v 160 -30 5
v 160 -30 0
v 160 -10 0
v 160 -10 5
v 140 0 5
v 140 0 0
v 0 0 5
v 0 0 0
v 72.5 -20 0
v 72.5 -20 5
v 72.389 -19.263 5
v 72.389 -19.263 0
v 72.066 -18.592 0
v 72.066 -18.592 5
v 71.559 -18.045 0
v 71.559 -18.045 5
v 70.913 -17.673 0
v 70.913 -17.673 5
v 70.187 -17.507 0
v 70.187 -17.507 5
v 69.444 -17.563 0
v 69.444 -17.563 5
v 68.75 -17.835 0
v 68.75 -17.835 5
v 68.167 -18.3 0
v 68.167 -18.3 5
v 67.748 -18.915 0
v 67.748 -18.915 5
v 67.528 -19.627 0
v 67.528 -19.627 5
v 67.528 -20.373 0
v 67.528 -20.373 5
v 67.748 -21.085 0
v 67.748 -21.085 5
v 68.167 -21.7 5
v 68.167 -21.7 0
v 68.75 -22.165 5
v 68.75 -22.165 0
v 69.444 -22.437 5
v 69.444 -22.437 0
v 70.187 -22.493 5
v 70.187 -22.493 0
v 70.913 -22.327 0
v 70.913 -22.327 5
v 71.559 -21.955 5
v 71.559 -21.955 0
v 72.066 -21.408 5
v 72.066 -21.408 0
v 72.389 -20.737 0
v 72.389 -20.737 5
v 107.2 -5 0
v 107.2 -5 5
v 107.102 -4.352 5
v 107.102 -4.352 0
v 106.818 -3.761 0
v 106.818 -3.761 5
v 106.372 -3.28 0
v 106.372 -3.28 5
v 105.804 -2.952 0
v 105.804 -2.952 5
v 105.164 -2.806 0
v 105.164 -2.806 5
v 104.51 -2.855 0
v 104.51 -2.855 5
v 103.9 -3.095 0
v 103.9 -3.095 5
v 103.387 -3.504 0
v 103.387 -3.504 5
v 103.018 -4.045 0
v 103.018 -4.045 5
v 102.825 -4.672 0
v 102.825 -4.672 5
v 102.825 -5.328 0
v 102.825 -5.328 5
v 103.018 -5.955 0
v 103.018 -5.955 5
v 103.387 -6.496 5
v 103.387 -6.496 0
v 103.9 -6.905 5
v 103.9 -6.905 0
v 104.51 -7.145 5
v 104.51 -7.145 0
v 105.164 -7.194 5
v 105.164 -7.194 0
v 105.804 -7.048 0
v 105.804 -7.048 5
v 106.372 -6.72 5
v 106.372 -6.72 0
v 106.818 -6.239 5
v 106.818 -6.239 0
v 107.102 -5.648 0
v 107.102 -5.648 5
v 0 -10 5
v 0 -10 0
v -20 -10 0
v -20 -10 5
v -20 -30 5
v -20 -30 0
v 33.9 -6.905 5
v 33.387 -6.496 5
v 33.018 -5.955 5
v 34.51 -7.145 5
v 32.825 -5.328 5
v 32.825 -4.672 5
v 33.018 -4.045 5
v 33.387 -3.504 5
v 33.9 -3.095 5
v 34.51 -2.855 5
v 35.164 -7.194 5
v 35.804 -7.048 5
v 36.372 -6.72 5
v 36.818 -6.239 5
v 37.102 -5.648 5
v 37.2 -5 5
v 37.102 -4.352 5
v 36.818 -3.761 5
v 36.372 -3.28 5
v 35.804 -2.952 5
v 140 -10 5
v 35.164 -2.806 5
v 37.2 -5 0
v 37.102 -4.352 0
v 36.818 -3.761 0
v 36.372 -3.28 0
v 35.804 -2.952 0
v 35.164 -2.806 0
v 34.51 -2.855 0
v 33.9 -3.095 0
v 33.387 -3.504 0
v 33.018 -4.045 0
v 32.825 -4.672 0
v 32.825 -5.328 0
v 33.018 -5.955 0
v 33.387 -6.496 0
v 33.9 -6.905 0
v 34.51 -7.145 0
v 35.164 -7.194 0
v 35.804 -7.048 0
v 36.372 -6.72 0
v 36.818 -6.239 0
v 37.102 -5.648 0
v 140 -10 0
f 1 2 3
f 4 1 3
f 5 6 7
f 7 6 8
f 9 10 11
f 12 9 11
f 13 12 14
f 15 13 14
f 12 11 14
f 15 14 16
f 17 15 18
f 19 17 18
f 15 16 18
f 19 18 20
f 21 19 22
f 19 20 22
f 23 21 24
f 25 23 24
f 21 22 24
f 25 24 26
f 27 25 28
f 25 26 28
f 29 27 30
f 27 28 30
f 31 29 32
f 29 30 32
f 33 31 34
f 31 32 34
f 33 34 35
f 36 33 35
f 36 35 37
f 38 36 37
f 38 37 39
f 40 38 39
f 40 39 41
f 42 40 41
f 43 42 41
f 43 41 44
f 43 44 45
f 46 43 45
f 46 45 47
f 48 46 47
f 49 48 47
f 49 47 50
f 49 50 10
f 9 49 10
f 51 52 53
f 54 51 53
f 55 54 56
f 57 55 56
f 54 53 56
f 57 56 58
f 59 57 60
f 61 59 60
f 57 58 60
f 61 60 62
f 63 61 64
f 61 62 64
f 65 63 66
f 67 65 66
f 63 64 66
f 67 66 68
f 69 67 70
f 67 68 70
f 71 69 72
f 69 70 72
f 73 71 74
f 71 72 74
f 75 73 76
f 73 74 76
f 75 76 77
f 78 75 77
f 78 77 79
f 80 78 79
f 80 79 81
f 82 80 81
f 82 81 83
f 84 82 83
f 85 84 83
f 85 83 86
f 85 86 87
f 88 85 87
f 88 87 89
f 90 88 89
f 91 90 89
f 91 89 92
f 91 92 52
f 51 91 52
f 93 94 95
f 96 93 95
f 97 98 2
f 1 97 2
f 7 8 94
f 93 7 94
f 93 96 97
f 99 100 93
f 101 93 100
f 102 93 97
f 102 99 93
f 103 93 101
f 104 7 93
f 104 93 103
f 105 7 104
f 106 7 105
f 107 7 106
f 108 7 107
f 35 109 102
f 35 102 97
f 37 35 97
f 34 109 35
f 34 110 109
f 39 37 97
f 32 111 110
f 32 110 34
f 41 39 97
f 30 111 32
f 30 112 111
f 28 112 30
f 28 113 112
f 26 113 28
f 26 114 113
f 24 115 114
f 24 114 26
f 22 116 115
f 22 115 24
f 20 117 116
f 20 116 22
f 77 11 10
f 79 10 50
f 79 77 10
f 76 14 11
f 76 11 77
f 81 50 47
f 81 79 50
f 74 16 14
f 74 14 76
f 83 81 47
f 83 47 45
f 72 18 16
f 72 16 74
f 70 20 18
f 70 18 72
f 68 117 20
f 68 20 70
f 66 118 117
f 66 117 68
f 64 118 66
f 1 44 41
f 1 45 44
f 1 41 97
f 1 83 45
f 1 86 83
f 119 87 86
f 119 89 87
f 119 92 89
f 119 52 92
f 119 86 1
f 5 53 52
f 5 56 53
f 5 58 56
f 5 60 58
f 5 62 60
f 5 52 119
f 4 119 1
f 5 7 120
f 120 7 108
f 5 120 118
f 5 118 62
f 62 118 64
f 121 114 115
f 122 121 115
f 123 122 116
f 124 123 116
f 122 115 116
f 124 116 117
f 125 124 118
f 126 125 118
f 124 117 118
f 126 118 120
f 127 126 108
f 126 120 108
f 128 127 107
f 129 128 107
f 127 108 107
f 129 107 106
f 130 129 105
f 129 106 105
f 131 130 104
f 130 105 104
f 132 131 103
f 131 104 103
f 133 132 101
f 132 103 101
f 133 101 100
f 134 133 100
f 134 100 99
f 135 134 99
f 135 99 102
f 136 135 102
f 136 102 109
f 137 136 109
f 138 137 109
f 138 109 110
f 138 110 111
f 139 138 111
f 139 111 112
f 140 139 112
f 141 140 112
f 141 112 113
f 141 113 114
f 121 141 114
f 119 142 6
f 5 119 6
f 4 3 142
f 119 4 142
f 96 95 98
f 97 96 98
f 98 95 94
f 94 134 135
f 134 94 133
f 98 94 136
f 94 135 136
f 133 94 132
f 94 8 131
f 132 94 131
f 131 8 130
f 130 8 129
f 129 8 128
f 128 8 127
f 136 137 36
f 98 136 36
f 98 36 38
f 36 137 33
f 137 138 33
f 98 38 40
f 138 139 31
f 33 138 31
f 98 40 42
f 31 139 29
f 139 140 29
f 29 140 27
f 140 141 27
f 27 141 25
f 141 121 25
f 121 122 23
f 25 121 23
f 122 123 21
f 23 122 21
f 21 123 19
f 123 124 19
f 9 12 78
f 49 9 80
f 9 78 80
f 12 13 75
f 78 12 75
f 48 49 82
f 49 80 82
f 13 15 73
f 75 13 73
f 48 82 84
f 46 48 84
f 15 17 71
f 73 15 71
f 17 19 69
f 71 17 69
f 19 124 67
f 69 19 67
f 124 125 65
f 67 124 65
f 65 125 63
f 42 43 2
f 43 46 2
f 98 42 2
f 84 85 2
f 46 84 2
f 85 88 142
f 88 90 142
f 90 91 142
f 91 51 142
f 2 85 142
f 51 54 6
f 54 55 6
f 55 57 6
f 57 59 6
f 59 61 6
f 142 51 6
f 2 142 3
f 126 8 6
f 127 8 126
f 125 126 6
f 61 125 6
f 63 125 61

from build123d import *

# Parameters (mm, degrees)
DODANIE_WYCI_GNI_CIE1_DEPTH = 5
SZKIC2_R                    = 2.2
WYTNIJ_WYCI_GNI_CIE1_DEPTH  = 10
SZKIC6_R                    = 2.5
WYTNIJ_WYCI_GNI_CIE3_DEPTH  = 163.864974749


with BuildPart() as part:
    # Szkic1 → Dodanie-wyciągnięcie1 (new body)
    with BuildSketch(Plane.XY):
        Polygon((0, -10), (-20, -10), (-20, -30), (160, -30), (160, -10), (140, -10), (140, 0), (0, 0), align=None)
    extrude(amount=DODANIE_WYCI_GNI_CIE1_DEPTH)

    # Szkic2 → Wytnij-wyciągnięcie1 (cut)
    with BuildSketch(Plane.XY.offset(5)):
        with Locations((35, -5)):
            Circle(SZKIC2_R)
        with Locations((105, -5)):
            Circle(SZKIC2_R)
    extrude(amount=-WYTNIJ_WYCI_GNI_CIE1_DEPTH, mode=Mode.SUBTRACT)

    # Szkic6 → Wytnij-wyciągnięcie3 (cut, through all)
    with BuildSketch(Plane.XY.offset(5)):
        with Locations((70, -20)):
            Circle(SZKIC6_R)
    extrude(amount=-WYTNIJ_WYCI_GNI_CIE3_DEPTH, mode=Mode.SUBTRACT)


solid = part.part
